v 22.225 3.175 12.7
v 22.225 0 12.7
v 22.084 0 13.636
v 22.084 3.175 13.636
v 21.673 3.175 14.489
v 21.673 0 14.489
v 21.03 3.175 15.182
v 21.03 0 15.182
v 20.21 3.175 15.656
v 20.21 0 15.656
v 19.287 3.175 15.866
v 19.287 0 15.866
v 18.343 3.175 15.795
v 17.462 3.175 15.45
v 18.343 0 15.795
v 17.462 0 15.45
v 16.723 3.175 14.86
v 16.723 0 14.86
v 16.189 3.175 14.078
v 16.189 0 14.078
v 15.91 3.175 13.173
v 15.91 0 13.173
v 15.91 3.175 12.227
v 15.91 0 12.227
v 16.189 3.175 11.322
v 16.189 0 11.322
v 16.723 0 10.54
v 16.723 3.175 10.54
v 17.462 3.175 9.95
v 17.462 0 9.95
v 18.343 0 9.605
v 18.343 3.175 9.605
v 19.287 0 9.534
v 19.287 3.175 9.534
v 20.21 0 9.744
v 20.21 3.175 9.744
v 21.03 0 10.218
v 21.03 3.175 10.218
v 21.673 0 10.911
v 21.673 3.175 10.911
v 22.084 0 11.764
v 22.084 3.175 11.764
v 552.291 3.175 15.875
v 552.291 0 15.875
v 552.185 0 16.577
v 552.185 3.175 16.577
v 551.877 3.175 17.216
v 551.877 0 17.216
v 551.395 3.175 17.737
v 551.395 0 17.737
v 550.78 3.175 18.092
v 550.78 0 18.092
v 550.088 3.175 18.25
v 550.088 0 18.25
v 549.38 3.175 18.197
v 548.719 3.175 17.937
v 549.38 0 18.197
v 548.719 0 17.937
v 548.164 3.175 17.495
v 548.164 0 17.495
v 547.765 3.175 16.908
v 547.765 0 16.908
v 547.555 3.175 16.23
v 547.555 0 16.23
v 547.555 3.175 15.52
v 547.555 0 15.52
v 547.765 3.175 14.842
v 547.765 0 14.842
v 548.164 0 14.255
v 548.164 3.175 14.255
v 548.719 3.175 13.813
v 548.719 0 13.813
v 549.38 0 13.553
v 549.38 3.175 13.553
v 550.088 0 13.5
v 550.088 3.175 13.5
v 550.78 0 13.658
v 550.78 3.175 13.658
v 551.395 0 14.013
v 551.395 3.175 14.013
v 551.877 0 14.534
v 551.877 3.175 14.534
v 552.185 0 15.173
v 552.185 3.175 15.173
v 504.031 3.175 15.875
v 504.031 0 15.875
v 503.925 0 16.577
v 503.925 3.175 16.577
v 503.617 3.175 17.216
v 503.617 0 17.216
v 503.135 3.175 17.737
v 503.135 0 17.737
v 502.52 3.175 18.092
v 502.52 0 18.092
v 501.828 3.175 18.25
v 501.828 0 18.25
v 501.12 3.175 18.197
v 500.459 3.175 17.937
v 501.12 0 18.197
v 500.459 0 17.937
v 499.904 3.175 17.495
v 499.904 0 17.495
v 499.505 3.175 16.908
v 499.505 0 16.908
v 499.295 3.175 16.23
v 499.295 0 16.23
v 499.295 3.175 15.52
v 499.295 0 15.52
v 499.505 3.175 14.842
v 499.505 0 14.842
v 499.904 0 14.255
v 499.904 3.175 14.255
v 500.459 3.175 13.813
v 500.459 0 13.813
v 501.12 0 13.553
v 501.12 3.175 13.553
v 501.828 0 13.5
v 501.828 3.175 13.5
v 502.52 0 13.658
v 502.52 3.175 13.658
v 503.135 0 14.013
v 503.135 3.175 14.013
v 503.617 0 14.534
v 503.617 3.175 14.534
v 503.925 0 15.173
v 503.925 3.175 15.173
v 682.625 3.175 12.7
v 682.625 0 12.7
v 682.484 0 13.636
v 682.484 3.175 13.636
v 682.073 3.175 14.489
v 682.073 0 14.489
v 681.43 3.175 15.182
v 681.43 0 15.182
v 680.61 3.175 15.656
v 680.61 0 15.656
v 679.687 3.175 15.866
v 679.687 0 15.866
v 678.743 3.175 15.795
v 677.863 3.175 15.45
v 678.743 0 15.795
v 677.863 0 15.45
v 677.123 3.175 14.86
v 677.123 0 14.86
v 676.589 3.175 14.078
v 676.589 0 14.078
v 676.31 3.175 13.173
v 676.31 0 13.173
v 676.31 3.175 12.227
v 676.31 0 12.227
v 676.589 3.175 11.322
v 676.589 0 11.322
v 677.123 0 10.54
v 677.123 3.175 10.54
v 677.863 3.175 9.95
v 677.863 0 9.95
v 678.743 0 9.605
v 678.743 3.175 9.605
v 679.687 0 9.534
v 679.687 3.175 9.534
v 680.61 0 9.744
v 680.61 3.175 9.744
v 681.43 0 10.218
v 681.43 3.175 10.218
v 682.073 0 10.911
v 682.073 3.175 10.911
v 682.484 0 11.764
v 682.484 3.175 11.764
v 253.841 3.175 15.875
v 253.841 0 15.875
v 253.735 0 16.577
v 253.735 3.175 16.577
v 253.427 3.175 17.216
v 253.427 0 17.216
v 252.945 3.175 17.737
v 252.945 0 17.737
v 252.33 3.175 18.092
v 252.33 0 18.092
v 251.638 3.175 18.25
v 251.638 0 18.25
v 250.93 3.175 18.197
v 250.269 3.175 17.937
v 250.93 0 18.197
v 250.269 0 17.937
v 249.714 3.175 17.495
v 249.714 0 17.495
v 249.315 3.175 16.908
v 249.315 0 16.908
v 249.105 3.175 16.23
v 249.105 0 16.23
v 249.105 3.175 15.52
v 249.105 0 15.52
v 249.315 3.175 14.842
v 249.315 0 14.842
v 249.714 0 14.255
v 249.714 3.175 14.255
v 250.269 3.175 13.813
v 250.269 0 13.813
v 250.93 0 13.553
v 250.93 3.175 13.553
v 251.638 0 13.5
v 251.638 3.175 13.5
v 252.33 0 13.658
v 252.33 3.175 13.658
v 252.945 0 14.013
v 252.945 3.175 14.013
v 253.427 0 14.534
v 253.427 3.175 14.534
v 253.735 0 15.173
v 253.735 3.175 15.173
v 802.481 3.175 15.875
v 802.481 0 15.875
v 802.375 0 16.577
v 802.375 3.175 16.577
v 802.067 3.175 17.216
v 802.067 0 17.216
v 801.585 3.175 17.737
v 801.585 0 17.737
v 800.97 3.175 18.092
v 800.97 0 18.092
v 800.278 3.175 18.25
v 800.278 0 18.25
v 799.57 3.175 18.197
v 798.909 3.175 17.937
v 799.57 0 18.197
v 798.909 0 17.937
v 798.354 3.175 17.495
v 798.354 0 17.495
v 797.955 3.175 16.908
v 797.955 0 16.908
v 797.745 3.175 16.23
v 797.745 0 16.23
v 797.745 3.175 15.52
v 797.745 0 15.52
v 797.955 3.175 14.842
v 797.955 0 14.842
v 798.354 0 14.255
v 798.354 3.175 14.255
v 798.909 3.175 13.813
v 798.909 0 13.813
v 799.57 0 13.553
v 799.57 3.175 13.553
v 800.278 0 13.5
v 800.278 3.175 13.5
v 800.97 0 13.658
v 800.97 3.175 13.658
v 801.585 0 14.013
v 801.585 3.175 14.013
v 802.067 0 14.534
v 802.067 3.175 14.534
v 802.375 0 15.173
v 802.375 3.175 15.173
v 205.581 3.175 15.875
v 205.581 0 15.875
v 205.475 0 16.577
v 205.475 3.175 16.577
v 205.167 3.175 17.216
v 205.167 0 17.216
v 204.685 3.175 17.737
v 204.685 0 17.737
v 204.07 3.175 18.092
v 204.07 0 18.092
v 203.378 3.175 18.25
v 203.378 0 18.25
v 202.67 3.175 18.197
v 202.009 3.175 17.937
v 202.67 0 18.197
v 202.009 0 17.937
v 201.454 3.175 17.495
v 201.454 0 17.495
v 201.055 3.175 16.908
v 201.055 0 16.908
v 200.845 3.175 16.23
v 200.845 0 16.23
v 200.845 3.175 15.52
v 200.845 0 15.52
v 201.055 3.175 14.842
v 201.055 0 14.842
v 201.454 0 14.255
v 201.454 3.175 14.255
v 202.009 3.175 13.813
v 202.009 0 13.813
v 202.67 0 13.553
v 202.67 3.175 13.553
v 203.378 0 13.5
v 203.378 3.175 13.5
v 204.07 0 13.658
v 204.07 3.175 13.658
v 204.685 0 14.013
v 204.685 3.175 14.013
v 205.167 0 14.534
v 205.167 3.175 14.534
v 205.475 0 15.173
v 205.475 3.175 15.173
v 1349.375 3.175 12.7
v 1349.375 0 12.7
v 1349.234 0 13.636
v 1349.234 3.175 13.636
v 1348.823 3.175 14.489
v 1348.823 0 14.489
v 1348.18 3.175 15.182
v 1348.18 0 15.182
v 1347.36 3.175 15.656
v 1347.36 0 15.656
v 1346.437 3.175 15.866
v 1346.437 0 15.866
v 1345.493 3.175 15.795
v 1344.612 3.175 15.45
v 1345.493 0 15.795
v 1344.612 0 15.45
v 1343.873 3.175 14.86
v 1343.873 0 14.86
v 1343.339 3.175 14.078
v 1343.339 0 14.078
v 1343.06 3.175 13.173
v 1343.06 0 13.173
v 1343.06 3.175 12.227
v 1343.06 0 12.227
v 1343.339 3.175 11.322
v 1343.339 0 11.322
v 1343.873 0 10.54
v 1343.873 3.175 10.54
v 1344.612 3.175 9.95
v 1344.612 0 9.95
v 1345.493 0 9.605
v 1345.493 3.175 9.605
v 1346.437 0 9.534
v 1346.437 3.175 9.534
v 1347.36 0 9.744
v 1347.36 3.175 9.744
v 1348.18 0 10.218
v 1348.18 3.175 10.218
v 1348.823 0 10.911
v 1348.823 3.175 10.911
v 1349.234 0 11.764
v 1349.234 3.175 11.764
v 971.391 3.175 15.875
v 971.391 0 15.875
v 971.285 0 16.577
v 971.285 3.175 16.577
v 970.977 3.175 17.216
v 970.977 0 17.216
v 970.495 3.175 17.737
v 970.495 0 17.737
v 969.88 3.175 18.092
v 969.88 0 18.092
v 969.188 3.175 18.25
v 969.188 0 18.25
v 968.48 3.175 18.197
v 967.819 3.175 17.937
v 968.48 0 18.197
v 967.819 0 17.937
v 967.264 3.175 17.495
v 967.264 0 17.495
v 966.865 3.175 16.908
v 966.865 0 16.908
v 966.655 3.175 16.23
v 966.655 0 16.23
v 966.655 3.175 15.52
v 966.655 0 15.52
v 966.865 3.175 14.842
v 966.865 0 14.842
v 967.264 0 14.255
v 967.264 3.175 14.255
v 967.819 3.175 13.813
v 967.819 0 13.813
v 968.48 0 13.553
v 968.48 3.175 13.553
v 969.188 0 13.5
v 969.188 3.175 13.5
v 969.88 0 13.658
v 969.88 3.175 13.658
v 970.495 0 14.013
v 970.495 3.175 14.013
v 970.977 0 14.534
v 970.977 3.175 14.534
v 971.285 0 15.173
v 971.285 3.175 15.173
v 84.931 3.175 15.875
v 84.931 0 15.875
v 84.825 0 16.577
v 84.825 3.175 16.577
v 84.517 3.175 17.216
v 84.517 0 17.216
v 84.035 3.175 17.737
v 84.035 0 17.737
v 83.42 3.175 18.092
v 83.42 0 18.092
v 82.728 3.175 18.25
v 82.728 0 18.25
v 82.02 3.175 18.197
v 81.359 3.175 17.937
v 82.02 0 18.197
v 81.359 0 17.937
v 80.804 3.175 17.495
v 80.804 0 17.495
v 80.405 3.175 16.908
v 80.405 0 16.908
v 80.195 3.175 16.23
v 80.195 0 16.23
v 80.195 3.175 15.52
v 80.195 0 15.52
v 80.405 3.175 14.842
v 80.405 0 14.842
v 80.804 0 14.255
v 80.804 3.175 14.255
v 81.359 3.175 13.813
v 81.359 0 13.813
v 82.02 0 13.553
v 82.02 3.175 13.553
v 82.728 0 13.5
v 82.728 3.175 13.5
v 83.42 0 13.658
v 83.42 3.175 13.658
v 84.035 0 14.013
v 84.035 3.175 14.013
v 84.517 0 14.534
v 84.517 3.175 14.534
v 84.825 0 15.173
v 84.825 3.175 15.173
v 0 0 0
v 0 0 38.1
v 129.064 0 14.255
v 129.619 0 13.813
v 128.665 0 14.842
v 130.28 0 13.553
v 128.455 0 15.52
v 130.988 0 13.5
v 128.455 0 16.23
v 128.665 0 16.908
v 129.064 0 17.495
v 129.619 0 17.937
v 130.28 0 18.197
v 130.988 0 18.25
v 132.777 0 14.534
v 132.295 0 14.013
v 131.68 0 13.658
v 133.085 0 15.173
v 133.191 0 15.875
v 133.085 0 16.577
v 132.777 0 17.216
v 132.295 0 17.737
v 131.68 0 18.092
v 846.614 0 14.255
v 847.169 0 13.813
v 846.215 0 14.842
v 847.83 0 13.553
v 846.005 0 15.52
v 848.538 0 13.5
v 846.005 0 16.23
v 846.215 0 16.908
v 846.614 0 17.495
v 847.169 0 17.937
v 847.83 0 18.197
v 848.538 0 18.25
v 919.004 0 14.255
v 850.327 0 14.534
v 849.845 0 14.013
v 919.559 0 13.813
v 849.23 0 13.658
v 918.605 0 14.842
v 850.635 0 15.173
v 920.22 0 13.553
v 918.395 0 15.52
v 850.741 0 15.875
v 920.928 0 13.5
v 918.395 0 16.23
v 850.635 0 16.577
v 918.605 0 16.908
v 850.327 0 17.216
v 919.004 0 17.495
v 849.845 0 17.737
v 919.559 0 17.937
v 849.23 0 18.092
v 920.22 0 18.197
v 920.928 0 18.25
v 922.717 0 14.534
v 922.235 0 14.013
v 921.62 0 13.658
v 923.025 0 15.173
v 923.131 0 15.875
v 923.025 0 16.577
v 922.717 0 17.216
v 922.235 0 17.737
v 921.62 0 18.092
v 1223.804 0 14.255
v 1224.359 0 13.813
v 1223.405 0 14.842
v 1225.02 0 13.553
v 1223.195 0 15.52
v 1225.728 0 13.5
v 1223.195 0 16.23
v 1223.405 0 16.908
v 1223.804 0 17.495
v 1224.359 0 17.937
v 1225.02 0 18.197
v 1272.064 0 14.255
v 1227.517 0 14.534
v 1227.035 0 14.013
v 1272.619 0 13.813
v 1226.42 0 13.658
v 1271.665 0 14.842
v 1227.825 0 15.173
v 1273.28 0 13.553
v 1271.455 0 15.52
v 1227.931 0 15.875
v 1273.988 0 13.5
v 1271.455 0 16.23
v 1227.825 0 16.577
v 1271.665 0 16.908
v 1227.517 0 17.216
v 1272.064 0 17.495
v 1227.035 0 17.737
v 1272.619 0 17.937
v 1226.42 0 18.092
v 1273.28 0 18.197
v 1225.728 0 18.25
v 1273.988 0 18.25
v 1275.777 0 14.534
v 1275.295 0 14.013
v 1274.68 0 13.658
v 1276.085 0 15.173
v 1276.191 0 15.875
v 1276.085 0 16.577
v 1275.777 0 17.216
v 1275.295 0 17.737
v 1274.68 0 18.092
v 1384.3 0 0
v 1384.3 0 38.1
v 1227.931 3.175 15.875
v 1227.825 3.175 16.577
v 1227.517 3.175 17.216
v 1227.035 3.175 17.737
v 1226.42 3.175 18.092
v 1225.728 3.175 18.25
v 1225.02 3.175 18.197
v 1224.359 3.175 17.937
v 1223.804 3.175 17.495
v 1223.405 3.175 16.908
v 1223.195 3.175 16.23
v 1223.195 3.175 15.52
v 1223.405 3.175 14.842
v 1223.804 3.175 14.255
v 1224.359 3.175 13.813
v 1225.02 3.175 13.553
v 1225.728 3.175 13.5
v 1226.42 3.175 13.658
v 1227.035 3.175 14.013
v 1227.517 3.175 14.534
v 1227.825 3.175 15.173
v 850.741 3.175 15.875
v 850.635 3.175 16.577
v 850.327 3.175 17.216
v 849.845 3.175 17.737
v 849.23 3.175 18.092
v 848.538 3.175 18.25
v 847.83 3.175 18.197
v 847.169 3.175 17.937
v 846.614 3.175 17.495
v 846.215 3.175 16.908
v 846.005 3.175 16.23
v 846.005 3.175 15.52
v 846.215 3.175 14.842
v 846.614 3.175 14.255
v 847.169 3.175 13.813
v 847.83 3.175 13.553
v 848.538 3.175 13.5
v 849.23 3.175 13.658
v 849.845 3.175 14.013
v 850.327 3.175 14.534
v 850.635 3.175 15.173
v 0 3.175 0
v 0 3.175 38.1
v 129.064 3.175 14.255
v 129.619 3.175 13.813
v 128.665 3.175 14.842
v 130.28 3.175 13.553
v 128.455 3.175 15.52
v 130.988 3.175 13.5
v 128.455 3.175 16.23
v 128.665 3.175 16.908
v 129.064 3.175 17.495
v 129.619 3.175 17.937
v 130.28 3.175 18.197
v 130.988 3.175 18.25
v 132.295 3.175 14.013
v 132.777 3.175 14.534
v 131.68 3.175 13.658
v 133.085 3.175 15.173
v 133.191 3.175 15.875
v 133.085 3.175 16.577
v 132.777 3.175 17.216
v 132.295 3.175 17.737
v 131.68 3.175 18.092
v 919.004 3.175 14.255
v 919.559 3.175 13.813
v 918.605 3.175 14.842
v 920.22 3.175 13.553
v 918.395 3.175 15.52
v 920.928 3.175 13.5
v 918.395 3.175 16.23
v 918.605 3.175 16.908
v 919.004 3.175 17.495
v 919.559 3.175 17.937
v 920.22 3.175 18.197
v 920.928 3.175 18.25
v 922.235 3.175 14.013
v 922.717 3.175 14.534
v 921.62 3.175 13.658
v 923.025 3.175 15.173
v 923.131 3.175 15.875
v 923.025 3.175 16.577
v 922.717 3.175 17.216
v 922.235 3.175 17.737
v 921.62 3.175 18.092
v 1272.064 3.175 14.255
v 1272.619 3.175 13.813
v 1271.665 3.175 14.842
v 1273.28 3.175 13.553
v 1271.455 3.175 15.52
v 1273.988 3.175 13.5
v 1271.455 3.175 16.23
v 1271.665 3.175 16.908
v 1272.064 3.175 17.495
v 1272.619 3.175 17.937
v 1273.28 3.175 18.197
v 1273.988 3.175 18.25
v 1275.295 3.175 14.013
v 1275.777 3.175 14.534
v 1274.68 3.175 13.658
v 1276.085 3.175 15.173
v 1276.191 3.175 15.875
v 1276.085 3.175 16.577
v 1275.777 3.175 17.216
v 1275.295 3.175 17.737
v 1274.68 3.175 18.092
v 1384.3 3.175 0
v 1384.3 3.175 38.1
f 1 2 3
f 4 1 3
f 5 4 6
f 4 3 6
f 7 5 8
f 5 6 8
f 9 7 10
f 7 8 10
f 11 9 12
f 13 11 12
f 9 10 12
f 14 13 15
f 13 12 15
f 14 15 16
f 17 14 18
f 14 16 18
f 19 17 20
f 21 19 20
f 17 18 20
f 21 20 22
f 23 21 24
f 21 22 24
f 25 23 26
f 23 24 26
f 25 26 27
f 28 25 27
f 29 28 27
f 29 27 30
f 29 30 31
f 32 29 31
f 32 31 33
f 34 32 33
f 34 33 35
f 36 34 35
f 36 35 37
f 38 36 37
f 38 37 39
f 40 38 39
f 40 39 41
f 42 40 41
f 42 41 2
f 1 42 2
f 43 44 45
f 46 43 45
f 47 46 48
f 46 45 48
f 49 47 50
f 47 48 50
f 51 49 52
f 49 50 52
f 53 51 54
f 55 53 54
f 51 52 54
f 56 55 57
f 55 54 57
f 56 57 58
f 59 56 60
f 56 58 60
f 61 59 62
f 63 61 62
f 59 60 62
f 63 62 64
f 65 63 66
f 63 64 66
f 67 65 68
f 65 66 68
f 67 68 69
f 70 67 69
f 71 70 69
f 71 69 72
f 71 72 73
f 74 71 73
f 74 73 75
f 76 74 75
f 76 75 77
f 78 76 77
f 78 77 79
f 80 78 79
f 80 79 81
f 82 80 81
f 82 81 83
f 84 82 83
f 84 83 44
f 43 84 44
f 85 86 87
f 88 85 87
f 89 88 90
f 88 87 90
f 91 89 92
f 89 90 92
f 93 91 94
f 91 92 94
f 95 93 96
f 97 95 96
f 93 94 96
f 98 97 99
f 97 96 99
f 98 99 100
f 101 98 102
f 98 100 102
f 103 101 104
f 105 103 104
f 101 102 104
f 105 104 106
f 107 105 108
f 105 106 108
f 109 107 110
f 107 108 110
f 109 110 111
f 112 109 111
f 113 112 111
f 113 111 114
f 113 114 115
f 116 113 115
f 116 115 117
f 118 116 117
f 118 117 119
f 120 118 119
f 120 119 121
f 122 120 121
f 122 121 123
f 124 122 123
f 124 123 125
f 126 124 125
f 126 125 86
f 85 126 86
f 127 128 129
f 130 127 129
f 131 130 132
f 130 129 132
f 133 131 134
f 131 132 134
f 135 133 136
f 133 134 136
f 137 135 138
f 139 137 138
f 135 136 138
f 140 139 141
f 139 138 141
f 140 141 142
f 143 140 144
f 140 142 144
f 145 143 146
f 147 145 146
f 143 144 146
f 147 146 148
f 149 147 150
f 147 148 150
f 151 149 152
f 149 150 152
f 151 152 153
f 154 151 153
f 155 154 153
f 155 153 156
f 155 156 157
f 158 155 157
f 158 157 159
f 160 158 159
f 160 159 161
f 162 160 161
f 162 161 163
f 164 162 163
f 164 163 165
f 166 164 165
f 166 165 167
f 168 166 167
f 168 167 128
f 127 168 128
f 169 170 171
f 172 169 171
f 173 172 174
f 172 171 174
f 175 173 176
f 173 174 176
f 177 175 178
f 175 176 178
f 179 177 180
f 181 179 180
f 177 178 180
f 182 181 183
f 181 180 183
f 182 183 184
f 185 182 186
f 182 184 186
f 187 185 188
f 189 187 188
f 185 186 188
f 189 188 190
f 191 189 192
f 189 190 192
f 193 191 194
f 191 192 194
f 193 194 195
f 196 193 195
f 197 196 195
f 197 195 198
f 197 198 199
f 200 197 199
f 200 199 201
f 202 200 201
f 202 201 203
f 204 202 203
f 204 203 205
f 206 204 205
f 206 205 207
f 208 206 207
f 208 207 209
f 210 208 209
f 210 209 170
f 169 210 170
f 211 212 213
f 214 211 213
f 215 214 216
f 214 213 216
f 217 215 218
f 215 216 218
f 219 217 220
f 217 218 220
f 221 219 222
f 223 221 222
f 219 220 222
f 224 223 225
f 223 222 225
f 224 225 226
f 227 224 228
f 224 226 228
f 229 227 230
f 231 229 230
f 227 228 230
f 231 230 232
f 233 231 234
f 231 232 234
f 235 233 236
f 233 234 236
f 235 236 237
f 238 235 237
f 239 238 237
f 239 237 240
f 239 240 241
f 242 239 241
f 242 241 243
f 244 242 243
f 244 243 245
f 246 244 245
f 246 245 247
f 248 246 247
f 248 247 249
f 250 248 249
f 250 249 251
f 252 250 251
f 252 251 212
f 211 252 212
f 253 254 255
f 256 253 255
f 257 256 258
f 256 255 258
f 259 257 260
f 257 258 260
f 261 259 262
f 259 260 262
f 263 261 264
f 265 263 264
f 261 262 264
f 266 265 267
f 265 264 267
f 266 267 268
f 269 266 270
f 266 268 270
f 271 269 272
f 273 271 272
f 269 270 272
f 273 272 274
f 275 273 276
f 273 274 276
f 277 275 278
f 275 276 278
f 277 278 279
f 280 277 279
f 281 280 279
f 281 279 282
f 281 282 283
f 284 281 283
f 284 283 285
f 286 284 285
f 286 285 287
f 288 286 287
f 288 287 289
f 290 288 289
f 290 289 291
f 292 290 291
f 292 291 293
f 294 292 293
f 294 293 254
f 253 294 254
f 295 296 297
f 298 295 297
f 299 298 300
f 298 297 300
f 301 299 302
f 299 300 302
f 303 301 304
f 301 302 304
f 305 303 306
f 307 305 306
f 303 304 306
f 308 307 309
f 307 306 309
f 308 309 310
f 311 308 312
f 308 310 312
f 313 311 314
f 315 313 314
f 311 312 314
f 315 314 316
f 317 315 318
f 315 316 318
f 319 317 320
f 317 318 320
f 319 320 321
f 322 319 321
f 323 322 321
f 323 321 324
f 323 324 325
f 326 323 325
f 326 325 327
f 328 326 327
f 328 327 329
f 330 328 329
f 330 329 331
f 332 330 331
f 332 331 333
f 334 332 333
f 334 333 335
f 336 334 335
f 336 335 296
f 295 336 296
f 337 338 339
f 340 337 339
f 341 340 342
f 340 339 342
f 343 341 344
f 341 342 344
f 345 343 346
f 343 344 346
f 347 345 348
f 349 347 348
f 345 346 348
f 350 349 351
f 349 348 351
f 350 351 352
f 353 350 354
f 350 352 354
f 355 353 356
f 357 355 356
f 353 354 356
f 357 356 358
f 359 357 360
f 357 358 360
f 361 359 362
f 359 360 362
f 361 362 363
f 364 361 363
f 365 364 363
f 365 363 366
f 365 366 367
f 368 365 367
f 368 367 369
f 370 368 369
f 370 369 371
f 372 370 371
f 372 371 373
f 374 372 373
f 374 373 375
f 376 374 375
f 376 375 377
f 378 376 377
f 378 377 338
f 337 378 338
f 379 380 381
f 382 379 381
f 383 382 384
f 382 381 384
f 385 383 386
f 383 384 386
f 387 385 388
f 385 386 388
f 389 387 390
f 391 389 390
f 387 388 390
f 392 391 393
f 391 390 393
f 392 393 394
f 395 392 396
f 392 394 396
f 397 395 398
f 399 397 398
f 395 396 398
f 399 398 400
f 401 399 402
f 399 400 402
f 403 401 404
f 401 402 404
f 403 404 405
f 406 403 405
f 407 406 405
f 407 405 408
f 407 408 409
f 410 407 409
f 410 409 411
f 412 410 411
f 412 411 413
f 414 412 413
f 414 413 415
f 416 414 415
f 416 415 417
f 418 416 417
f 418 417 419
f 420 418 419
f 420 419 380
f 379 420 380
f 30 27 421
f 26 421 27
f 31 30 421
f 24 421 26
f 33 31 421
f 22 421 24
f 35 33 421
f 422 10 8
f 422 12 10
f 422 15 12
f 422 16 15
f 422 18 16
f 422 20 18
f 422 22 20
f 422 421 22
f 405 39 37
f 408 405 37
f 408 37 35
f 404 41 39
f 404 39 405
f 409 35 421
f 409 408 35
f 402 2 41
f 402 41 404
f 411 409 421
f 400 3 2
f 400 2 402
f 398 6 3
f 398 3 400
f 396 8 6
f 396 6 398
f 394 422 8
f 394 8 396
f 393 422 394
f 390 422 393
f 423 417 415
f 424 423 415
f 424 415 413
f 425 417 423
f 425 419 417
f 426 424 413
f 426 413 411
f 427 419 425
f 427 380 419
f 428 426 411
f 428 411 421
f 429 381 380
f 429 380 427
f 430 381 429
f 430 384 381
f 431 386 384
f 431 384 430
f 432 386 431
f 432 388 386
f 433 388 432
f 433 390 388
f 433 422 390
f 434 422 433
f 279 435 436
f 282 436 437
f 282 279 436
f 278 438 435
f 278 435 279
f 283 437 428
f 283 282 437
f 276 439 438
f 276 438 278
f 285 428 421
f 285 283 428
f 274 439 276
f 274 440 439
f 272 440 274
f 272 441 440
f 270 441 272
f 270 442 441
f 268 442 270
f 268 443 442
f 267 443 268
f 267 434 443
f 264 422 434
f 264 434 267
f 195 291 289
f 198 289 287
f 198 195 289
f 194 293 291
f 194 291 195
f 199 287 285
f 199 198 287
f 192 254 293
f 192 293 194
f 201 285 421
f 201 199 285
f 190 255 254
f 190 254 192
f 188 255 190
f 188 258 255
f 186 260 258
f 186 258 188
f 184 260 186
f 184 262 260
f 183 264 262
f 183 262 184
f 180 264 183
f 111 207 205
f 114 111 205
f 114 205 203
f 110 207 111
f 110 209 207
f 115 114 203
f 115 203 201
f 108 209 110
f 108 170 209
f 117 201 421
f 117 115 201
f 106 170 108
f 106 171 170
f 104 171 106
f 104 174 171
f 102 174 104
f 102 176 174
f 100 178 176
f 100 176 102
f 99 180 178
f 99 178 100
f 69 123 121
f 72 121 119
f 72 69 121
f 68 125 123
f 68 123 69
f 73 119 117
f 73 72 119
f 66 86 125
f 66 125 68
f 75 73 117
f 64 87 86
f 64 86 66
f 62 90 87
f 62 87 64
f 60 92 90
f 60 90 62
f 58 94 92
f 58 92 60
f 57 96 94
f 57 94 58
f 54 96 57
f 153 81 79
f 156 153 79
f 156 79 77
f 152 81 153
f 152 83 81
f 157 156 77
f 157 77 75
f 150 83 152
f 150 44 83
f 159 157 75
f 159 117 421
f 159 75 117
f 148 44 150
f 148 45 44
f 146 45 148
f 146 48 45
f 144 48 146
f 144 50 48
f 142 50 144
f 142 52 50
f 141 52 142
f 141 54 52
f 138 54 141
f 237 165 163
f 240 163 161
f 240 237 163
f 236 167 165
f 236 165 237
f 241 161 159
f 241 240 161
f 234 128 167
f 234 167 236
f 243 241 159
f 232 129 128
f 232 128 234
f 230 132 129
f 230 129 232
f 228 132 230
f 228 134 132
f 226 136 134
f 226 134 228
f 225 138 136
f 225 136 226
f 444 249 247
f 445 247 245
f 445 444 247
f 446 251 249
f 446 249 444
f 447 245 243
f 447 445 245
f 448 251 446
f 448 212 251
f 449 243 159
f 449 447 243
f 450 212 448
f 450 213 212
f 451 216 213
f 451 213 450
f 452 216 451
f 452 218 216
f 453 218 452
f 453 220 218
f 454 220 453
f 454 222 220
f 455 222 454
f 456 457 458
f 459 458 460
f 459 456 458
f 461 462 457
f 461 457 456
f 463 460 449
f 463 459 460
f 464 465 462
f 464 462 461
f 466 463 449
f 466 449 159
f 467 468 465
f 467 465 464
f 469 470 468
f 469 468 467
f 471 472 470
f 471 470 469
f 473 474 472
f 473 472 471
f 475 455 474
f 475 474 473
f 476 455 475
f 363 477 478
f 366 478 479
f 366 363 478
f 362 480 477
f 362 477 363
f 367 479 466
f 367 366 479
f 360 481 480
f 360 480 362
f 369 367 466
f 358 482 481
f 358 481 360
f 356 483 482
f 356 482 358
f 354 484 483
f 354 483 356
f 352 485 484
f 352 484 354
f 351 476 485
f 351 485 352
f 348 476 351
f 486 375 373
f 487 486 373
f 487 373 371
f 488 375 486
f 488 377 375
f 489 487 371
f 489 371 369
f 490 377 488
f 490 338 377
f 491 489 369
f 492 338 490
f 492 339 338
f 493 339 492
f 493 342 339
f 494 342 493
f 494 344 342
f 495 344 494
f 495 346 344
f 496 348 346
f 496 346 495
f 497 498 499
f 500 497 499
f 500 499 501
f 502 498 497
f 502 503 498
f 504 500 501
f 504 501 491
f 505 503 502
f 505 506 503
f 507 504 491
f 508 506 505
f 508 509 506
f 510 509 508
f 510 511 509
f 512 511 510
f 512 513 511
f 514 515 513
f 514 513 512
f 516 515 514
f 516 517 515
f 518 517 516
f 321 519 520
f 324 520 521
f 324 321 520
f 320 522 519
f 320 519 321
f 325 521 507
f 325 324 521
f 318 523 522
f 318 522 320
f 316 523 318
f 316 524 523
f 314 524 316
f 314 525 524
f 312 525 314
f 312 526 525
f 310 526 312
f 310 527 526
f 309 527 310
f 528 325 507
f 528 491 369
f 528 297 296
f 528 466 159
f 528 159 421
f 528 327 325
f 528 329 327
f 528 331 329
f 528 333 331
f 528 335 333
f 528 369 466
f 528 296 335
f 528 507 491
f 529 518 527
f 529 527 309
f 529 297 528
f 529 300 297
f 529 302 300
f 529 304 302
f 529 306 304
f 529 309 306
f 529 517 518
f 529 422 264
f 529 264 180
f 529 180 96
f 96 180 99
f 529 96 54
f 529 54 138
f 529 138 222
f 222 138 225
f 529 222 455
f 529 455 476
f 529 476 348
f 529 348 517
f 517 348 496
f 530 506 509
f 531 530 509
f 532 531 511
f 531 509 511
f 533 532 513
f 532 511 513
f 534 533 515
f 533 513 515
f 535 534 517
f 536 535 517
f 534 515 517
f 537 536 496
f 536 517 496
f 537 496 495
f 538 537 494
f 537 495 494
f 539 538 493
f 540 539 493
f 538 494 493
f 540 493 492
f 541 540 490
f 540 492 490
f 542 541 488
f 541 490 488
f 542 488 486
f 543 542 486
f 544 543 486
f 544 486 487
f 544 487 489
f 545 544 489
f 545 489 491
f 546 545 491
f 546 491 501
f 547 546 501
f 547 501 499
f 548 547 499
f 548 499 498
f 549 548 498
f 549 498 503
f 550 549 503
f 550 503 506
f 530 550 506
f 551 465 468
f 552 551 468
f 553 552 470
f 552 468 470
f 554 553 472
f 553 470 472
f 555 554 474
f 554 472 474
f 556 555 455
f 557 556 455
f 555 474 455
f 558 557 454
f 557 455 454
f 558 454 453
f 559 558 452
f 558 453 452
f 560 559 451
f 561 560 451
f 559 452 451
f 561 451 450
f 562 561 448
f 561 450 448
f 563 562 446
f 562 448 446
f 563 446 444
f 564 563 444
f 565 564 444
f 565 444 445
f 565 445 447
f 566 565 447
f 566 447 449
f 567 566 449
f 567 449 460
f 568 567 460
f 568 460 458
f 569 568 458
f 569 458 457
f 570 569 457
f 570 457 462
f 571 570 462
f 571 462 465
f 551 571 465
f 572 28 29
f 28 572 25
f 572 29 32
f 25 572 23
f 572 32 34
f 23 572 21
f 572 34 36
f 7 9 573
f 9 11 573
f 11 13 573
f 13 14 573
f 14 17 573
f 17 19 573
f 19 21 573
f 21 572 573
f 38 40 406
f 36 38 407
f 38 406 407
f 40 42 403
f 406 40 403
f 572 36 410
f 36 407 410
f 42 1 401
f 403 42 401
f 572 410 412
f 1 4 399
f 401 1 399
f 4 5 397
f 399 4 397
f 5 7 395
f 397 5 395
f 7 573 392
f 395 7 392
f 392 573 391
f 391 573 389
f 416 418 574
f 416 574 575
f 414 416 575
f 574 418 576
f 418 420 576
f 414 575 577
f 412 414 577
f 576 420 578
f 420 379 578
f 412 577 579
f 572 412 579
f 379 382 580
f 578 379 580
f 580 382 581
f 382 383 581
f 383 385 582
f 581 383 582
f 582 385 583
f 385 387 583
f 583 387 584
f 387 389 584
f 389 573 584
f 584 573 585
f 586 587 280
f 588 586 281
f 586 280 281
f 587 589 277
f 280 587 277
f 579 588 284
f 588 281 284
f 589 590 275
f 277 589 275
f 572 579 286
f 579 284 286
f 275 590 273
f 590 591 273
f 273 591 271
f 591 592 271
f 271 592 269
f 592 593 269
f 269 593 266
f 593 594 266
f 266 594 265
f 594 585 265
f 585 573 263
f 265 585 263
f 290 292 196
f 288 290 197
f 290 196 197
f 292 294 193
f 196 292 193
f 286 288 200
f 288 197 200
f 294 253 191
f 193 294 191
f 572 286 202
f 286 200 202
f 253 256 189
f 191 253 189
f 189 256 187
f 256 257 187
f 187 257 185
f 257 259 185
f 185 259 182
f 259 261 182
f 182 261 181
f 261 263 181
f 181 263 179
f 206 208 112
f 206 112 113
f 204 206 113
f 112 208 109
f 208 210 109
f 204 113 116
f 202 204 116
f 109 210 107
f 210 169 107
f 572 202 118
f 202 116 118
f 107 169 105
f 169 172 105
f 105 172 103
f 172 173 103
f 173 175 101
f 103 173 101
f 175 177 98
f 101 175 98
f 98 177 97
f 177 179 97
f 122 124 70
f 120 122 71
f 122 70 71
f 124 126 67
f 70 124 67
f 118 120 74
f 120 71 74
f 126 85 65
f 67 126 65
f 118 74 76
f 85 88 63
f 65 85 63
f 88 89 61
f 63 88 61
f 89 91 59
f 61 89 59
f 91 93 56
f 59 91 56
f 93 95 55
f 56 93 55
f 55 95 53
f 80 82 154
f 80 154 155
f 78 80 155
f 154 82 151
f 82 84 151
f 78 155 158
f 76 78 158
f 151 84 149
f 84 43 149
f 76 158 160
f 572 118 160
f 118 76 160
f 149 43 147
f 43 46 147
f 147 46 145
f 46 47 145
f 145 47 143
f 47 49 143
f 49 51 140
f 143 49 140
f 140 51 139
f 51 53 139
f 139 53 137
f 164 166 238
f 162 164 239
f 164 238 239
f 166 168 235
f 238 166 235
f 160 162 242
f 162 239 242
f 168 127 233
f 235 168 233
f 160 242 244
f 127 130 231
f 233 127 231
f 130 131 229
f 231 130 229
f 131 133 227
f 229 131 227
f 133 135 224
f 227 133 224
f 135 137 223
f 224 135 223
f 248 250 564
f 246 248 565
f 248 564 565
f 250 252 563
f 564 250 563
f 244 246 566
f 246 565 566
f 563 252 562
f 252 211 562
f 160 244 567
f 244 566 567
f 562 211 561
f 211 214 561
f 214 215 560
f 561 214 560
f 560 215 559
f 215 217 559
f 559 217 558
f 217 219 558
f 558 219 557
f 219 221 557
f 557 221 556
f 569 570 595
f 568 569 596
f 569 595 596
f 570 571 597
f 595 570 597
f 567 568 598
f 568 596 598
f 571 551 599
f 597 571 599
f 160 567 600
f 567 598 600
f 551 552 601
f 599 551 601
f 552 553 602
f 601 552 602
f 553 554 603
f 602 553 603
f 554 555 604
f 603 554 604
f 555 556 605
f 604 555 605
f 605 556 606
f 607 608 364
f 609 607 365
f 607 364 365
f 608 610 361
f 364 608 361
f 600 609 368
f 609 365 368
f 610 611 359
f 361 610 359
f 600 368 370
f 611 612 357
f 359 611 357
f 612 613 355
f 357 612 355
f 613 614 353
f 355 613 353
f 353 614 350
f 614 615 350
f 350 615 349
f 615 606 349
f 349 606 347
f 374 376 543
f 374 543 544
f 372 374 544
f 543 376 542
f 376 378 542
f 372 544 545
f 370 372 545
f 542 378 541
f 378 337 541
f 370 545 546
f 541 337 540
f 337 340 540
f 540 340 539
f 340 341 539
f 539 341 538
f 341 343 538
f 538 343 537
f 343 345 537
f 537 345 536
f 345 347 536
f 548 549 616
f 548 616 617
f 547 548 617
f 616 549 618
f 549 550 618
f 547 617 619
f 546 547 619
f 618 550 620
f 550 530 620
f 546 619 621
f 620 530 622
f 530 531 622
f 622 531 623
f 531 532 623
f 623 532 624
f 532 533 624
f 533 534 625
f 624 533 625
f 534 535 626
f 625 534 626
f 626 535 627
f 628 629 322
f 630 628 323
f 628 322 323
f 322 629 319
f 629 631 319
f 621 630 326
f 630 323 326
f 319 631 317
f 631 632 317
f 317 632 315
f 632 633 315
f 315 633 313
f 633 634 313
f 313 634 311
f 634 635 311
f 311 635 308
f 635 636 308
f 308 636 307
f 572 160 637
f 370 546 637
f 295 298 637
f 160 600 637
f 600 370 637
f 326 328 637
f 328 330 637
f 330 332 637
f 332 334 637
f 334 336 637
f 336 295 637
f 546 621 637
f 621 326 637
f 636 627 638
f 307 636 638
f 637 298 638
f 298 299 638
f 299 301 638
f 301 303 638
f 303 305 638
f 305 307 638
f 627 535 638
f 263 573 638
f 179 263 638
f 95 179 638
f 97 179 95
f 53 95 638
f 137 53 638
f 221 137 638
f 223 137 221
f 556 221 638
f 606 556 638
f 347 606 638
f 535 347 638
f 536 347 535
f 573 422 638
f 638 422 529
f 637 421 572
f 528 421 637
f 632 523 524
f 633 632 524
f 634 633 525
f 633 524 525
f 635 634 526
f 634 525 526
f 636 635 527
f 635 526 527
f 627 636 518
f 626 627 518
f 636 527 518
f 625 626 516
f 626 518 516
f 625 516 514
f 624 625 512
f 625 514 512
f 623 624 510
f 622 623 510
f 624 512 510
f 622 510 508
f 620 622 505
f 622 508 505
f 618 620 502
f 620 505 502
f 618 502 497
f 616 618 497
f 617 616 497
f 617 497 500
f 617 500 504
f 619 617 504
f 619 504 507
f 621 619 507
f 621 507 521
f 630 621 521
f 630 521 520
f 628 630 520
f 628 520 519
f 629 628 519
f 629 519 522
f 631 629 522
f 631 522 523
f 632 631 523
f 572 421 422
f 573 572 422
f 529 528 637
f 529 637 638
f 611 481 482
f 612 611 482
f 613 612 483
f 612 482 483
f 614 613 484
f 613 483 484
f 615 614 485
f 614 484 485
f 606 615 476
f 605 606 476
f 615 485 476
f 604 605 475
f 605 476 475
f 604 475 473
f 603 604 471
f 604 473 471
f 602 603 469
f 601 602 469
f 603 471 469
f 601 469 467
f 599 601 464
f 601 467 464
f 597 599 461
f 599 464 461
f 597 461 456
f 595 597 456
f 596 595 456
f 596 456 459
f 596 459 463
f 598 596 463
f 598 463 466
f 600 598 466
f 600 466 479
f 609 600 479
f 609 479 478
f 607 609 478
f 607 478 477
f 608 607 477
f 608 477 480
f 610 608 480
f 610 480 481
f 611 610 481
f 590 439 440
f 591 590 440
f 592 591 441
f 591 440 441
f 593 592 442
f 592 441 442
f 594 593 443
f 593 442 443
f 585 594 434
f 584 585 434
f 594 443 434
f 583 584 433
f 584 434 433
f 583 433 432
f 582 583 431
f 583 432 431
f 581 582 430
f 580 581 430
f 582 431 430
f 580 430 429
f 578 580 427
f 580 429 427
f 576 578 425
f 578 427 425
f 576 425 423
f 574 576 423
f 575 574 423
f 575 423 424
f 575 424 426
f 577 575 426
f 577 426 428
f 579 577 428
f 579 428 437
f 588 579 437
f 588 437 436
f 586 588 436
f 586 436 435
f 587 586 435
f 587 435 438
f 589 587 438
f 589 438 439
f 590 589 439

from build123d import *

# Parameters (mm, degrees)
F0_W     = 1384.3
F0_H     = 38.1
F1_DEPTH = 3.175
F2_R     = 3.175
F3_DEPTH = 3.176
F4_R     = 2.38125
F5_DEPTH = 3.176


with BuildPart() as f1:
    # F0 (on Front) → F1 (new body)
    with BuildSketch(Plane.XZ):
        with Locations((692.15, 19.05)):
            Rectangle(F0_W, F0_H)
    extrude(amount=-F1_DEPTH)

    # F2 (on face) → F3 (cut, through all)
    with BuildSketch(Plane.XZ):
        with Locations((1346.2, 12.7)):
            Circle(F2_R)
        with Locations((679.45, 12.7)):
            Circle(F2_R)
        with Locations((19.05, 12.7)):
            Circle(F2_R)
    extrude(amount=-F3_DEPTH, mode=Mode.SUBTRACT)

    # F4 (on face) → F5 (cut, through all)
    with BuildSketch(Plane.XZ):
        with Locations((82.55, 15.875)):
            Circle(F4_R)
        with Locations((130.81, 15.875)):
            Circle(F4_R)
        with Locations((203.2, 15.875)):
            Circle(F4_R)
        with Locations((251.46, 15.875)):
            Circle(F4_R)
        with Locations((501.65, 15.875)):
            Circle(F4_R)
        with Locations((549.91, 15.875)):
            Circle(F4_R)
        with Locations((920.75, 15.875)):
            Circle(F4_R)
        with Locations((969.01, 15.875)):
            Circle(F4_R)
        with Locations((1225.55, 15.875)):
            Circle(F4_R)
        with Locations((1273.81, 15.875)):
            Circle(F4_R)
        with Locations((800.1, 15.875)):
            Circle(F4_R)
        with Locations((848.36, 15.875)):
            Circle(F4_R)
    extrude(amount=-F5_DEPTH, mode=Mode.SUBTRACT)


solid = f1.part
